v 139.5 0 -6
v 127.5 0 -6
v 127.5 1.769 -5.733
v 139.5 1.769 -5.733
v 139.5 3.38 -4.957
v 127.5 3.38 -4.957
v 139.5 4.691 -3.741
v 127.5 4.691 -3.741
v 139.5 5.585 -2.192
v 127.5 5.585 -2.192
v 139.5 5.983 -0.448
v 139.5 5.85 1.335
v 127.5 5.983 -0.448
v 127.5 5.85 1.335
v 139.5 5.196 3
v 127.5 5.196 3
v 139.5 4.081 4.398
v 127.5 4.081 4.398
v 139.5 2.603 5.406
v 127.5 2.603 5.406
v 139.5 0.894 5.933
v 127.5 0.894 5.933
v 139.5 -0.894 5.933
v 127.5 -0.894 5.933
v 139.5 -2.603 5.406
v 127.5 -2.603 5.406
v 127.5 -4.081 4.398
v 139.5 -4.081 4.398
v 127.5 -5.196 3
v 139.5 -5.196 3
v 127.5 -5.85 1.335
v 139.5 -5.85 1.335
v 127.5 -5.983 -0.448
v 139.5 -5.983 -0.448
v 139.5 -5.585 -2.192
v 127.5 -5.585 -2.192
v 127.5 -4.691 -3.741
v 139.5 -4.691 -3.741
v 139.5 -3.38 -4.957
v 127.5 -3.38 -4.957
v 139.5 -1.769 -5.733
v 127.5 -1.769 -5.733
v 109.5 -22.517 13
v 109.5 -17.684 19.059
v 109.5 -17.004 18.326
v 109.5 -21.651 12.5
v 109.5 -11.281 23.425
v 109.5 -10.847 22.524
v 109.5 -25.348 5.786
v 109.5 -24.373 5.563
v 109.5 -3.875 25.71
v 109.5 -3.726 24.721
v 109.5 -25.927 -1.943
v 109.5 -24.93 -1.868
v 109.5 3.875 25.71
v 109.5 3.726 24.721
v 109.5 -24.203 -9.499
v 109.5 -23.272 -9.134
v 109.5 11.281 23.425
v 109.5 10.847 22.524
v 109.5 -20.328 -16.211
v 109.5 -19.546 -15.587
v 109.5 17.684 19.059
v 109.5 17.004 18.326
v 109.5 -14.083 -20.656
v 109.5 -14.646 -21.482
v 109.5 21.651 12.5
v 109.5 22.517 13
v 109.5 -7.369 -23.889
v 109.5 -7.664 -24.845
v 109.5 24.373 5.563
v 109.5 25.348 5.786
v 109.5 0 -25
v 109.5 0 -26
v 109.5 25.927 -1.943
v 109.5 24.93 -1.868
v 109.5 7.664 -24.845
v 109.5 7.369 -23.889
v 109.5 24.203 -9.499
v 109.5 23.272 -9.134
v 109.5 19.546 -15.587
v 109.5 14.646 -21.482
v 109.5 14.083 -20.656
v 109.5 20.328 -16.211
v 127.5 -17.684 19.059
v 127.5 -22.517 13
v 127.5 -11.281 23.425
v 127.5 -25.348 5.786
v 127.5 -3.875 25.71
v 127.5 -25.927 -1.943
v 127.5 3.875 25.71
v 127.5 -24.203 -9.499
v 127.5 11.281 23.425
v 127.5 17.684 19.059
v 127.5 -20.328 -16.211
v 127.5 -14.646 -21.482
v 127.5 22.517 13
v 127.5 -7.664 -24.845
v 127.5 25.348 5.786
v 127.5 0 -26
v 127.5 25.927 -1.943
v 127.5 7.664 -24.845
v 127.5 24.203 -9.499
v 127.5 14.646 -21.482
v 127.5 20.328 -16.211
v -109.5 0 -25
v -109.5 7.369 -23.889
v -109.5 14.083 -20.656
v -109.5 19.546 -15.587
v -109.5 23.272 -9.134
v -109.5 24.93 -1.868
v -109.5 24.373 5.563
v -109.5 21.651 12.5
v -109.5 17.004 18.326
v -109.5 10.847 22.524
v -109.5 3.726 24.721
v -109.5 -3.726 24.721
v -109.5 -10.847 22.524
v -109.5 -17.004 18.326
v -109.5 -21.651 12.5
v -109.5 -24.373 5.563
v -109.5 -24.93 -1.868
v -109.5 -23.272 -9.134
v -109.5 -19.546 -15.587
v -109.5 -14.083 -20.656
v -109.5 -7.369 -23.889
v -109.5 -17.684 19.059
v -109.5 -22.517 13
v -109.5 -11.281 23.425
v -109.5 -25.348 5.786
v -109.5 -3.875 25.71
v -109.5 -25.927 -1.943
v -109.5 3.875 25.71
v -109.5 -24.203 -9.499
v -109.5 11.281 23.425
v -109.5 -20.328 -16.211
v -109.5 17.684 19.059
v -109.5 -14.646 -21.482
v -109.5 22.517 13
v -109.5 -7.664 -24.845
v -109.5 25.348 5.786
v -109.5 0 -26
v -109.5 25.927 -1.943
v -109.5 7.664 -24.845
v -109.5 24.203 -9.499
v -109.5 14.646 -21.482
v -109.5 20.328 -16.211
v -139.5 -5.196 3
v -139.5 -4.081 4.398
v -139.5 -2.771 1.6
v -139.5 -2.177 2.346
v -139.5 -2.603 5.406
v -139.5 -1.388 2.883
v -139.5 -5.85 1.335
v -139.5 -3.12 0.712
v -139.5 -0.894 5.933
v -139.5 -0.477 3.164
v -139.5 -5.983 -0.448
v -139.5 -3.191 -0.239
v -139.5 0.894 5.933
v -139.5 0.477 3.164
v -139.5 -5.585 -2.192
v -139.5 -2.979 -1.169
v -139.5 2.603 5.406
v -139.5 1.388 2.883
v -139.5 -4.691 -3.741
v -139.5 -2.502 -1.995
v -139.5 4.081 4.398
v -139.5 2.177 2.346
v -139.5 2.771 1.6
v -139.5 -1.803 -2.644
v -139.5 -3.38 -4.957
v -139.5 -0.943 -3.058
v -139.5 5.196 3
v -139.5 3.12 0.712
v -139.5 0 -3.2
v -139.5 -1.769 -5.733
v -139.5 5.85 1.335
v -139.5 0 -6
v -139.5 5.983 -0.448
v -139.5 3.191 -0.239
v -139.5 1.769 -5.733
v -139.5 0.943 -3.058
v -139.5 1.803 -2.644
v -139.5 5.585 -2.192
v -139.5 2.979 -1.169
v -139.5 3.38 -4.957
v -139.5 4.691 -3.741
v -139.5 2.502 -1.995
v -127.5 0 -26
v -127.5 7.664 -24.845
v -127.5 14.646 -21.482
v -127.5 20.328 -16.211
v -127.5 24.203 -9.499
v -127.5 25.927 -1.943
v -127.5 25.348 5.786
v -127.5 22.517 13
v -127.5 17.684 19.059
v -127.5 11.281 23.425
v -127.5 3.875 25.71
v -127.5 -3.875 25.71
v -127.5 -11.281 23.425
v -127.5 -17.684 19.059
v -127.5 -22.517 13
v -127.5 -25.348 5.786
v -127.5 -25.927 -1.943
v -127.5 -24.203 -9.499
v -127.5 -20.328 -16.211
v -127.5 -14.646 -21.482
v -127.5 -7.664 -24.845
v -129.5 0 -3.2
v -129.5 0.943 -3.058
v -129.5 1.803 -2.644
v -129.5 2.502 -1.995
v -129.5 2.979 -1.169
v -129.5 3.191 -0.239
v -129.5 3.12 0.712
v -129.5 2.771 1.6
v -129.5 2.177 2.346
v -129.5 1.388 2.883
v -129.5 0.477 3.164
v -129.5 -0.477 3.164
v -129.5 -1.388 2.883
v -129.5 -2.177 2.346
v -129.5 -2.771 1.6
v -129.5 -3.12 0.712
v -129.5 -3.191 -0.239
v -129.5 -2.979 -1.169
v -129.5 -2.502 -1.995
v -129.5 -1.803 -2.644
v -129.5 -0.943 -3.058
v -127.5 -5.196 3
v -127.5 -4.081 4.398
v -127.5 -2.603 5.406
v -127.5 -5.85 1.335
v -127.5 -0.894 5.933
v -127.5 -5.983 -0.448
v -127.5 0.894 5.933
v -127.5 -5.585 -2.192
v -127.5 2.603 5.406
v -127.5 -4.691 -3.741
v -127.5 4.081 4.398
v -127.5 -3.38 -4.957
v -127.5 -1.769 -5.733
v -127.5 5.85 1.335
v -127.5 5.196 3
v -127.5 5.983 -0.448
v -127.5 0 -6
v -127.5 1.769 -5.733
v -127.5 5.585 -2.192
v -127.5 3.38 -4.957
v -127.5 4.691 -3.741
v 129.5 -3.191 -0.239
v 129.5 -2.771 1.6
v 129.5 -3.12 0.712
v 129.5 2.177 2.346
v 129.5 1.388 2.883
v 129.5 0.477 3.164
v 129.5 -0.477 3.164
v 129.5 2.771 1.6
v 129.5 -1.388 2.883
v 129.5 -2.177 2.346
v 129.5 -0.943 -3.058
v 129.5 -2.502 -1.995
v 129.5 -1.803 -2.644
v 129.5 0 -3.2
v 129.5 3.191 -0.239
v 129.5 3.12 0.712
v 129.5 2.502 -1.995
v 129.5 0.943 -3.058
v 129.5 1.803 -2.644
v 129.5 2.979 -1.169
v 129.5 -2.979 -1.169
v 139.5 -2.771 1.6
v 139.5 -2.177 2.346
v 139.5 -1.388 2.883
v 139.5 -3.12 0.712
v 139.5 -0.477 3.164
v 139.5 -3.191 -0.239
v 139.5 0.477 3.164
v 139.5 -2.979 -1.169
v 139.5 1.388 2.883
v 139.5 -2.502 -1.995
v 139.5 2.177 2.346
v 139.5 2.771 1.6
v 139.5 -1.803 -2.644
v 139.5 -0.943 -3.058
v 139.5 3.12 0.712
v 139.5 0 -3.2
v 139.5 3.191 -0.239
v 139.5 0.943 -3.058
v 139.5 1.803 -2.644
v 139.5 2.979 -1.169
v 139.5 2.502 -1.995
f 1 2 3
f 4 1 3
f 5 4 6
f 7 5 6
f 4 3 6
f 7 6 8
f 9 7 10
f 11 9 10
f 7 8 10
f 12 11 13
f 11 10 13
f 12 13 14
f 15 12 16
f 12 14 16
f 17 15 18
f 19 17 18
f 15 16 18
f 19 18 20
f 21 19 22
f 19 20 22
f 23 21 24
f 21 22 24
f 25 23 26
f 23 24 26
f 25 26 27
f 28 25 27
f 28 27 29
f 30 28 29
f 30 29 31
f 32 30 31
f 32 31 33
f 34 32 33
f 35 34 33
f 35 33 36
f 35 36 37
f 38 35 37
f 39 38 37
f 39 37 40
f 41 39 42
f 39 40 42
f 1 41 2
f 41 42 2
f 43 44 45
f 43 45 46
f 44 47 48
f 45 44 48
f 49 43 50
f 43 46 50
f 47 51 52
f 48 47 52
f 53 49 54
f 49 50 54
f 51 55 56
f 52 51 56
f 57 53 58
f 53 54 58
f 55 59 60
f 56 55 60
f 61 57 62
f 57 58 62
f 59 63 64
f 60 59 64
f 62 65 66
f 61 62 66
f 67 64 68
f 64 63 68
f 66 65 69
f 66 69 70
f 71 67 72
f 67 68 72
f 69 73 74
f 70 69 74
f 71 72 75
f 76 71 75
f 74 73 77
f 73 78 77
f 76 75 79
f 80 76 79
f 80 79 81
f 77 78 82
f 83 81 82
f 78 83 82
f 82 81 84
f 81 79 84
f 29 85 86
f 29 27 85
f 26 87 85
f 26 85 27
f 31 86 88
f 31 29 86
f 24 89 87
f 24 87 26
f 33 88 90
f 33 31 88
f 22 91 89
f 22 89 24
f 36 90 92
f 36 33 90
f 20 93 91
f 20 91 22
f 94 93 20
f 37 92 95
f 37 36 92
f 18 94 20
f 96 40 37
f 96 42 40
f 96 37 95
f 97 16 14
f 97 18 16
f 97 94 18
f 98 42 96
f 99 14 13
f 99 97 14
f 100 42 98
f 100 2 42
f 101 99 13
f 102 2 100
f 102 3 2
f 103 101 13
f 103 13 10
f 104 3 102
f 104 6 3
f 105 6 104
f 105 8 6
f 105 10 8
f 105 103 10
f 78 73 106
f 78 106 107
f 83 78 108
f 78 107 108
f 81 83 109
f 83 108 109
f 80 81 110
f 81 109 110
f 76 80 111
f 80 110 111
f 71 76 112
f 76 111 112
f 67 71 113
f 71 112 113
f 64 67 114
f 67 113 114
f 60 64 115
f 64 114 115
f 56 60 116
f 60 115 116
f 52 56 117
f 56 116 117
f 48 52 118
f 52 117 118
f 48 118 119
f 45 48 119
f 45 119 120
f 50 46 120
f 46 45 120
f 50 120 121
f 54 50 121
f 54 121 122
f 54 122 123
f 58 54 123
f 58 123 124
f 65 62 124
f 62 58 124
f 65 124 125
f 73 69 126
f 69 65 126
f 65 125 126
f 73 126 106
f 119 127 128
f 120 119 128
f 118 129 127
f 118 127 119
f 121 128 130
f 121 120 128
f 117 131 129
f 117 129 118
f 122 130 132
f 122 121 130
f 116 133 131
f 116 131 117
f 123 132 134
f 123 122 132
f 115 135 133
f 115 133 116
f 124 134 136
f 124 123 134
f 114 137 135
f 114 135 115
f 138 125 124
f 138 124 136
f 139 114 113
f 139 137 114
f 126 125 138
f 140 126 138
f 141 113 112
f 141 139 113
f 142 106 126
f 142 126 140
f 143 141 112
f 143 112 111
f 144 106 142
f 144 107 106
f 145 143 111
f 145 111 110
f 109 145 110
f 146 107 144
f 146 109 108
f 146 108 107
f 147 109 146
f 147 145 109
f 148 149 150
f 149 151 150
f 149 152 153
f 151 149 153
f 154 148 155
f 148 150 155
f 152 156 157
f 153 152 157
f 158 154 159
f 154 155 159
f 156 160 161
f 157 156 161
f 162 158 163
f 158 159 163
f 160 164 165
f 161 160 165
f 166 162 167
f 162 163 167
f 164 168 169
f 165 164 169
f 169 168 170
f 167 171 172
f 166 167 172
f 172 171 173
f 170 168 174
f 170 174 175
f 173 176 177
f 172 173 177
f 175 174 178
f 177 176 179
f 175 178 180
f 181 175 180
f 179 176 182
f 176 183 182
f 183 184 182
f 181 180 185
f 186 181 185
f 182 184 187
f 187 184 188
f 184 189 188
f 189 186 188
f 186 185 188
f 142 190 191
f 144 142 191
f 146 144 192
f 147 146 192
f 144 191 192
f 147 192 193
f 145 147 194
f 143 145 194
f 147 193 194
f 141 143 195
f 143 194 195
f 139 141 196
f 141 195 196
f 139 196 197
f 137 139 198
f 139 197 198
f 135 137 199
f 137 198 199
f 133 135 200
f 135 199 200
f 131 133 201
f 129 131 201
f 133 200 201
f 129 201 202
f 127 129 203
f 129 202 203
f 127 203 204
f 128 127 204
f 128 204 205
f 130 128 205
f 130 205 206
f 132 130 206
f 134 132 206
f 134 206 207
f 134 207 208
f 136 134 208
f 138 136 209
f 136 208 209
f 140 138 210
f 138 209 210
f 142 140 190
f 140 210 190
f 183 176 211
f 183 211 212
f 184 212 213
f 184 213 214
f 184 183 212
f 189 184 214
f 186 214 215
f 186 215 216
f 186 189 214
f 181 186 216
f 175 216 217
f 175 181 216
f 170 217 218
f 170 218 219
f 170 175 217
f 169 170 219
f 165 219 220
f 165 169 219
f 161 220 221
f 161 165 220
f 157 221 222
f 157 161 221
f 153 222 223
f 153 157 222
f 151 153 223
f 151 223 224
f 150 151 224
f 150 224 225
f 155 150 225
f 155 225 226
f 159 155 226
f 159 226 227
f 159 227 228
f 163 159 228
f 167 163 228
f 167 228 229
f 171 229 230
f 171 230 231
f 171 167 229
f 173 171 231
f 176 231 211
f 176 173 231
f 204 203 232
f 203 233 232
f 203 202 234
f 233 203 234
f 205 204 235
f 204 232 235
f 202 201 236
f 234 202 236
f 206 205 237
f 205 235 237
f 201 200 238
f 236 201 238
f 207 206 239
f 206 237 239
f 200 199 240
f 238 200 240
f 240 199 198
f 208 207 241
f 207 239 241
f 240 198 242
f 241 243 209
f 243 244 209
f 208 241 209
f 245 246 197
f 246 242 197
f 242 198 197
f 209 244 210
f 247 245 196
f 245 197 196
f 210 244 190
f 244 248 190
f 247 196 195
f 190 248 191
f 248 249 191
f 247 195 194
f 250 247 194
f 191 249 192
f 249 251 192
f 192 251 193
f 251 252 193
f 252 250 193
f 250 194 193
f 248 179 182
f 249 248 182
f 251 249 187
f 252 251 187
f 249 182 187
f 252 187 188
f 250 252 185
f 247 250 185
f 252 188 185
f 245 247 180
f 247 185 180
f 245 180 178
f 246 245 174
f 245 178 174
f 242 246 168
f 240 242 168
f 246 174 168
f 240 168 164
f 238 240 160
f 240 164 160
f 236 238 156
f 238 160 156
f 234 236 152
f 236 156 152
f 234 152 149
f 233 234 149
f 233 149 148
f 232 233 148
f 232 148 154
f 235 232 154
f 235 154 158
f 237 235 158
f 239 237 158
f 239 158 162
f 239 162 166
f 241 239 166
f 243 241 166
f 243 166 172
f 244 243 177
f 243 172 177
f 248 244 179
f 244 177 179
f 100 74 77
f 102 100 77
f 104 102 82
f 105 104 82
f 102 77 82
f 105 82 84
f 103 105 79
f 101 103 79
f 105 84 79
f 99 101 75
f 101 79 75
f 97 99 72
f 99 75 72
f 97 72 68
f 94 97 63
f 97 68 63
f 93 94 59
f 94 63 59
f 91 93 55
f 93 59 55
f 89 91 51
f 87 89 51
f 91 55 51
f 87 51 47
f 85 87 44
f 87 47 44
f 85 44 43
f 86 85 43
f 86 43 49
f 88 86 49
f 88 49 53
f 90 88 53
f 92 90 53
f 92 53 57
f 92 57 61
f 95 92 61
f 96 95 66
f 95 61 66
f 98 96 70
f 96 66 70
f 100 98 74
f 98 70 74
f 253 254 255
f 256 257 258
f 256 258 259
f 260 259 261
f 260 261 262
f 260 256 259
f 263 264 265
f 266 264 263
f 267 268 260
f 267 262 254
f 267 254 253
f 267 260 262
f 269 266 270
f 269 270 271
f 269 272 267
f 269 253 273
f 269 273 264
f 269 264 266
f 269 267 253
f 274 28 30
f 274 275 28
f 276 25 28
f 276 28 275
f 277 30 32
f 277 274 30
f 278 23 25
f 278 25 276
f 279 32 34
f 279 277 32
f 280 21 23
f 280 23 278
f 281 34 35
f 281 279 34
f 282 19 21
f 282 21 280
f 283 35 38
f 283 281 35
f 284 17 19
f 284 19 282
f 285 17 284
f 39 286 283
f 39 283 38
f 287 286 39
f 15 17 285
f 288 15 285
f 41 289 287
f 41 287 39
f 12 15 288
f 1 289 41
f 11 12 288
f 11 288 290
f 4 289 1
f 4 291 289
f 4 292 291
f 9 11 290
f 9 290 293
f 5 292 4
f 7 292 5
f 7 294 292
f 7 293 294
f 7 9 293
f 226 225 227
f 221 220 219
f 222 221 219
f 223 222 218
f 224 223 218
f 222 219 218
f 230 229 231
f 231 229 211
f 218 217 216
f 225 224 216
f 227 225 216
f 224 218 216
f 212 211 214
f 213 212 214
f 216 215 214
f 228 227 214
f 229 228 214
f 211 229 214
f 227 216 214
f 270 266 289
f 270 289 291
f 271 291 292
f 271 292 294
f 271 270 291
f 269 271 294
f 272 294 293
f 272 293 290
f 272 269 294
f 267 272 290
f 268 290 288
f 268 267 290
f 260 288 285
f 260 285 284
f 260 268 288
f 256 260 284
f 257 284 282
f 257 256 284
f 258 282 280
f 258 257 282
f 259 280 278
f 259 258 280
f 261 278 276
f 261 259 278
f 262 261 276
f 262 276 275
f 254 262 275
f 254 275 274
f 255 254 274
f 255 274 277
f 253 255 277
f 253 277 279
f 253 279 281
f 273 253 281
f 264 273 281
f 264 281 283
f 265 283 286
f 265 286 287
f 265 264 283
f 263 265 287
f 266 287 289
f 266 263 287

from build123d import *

# Parameters (mm, degrees)
BODY_START          = -127.5
SKETCH1_R           = 25
BODY_DEPTH          = 255
END_CAP_IN_START    = -127.5
SKETCH2_R           = 26
END_CAP_IN_DEPTH    = 18
END_CAP_OUT_START   = 109.5
SKETCH3_R           = 26
END_CAP_OUT_DEPTH   = 18
INLET_PORT_START    = -139.5
SKETCH4_R           = 6
INLET_PORT_DEPTH    = 12
INLET_SOCKET_START  = -139.5
SKETCH5_R           = 3.2
INLET_SOCKET_DEPTH  = 10
OUTLET_PORT_START   = 127.5
SKETCH6_R           = 6
OUTLET_PORT_DEPTH   = 12
OUTLET_SOCKET_START = 129.5
SKETCH7_R           = 3.2
OUTLET_SOCKET_DEPTH = 10


with BuildPart() as part:
    # Sketch1 → Body (new body)
    with BuildSketch(Plane(origin=(0, 0, 0), x_dir=(0, 0, -1), z_dir=(1, 0, 0)).offset(BODY_START)):
        Circle(SKETCH1_R)
    extrude(amount=BODY_DEPTH)

    # Sketch2 → End_Cap_In (add)
    with BuildSketch(Plane(origin=(0, 0, 0), x_dir=(0, 0, -1), z_dir=(1, 0, 0)).offset(END_CAP_IN_START)):
        Circle(SKETCH2_R)
    extrude(amount=END_CAP_IN_DEPTH)

    # Sketch3 → End_Cap_Out (add)
    with BuildSketch(Plane(origin=(0, 0, 0), x_dir=(0, 0, -1), z_dir=(1, 0, 0)).offset(END_CAP_OUT_START)):
        Circle(SKETCH3_R)
    extrude(amount=END_CAP_OUT_DEPTH)

    # Sketch4 → Inlet_Port (add)
    with BuildSketch(Plane(origin=(0, 0, 0), x_dir=(0, 0, -1), z_dir=(1, 0, 0)).offset(INLET_PORT_START)):
        Circle(SKETCH4_R)
    extrude(amount=INLET_PORT_DEPTH)

    # Sketch5 → Inlet_Socket (cut)
    with BuildSketch(Plane(origin=(0, 0, 0), x_dir=(0, 0, -1), z_dir=(1, 0, 0)).offset(INLET_SOCKET_START)):
        Circle(SKETCH5_R)
    extrude(amount=INLET_SOCKET_DEPTH, mode=Mode.SUBTRACT)

    # Sketch6 → Outlet_Port (add)
    with BuildSketch(Plane(origin=(0, 0, 0), x_dir=(0, 0, -1), z_dir=(1, 0, 0)).offset(OUTLET_PORT_START)):
        Circle(SKETCH6_R)
    extrude(amount=OUTLET_PORT_DEPTH)

    # Sketch7 → Outlet_Socket (cut)
    with BuildSketch(Plane(origin=(0, 0, 0), x_dir=(0, 0, -1), z_dir=(1, 0, 0)).offset(OUTLET_SOCKET_START)):
        Circle(SKETCH7_R)
    extrude(amount=OUTLET_SOCKET_DEPTH, mode=Mode.SUBTRACT)


solid = part.part
